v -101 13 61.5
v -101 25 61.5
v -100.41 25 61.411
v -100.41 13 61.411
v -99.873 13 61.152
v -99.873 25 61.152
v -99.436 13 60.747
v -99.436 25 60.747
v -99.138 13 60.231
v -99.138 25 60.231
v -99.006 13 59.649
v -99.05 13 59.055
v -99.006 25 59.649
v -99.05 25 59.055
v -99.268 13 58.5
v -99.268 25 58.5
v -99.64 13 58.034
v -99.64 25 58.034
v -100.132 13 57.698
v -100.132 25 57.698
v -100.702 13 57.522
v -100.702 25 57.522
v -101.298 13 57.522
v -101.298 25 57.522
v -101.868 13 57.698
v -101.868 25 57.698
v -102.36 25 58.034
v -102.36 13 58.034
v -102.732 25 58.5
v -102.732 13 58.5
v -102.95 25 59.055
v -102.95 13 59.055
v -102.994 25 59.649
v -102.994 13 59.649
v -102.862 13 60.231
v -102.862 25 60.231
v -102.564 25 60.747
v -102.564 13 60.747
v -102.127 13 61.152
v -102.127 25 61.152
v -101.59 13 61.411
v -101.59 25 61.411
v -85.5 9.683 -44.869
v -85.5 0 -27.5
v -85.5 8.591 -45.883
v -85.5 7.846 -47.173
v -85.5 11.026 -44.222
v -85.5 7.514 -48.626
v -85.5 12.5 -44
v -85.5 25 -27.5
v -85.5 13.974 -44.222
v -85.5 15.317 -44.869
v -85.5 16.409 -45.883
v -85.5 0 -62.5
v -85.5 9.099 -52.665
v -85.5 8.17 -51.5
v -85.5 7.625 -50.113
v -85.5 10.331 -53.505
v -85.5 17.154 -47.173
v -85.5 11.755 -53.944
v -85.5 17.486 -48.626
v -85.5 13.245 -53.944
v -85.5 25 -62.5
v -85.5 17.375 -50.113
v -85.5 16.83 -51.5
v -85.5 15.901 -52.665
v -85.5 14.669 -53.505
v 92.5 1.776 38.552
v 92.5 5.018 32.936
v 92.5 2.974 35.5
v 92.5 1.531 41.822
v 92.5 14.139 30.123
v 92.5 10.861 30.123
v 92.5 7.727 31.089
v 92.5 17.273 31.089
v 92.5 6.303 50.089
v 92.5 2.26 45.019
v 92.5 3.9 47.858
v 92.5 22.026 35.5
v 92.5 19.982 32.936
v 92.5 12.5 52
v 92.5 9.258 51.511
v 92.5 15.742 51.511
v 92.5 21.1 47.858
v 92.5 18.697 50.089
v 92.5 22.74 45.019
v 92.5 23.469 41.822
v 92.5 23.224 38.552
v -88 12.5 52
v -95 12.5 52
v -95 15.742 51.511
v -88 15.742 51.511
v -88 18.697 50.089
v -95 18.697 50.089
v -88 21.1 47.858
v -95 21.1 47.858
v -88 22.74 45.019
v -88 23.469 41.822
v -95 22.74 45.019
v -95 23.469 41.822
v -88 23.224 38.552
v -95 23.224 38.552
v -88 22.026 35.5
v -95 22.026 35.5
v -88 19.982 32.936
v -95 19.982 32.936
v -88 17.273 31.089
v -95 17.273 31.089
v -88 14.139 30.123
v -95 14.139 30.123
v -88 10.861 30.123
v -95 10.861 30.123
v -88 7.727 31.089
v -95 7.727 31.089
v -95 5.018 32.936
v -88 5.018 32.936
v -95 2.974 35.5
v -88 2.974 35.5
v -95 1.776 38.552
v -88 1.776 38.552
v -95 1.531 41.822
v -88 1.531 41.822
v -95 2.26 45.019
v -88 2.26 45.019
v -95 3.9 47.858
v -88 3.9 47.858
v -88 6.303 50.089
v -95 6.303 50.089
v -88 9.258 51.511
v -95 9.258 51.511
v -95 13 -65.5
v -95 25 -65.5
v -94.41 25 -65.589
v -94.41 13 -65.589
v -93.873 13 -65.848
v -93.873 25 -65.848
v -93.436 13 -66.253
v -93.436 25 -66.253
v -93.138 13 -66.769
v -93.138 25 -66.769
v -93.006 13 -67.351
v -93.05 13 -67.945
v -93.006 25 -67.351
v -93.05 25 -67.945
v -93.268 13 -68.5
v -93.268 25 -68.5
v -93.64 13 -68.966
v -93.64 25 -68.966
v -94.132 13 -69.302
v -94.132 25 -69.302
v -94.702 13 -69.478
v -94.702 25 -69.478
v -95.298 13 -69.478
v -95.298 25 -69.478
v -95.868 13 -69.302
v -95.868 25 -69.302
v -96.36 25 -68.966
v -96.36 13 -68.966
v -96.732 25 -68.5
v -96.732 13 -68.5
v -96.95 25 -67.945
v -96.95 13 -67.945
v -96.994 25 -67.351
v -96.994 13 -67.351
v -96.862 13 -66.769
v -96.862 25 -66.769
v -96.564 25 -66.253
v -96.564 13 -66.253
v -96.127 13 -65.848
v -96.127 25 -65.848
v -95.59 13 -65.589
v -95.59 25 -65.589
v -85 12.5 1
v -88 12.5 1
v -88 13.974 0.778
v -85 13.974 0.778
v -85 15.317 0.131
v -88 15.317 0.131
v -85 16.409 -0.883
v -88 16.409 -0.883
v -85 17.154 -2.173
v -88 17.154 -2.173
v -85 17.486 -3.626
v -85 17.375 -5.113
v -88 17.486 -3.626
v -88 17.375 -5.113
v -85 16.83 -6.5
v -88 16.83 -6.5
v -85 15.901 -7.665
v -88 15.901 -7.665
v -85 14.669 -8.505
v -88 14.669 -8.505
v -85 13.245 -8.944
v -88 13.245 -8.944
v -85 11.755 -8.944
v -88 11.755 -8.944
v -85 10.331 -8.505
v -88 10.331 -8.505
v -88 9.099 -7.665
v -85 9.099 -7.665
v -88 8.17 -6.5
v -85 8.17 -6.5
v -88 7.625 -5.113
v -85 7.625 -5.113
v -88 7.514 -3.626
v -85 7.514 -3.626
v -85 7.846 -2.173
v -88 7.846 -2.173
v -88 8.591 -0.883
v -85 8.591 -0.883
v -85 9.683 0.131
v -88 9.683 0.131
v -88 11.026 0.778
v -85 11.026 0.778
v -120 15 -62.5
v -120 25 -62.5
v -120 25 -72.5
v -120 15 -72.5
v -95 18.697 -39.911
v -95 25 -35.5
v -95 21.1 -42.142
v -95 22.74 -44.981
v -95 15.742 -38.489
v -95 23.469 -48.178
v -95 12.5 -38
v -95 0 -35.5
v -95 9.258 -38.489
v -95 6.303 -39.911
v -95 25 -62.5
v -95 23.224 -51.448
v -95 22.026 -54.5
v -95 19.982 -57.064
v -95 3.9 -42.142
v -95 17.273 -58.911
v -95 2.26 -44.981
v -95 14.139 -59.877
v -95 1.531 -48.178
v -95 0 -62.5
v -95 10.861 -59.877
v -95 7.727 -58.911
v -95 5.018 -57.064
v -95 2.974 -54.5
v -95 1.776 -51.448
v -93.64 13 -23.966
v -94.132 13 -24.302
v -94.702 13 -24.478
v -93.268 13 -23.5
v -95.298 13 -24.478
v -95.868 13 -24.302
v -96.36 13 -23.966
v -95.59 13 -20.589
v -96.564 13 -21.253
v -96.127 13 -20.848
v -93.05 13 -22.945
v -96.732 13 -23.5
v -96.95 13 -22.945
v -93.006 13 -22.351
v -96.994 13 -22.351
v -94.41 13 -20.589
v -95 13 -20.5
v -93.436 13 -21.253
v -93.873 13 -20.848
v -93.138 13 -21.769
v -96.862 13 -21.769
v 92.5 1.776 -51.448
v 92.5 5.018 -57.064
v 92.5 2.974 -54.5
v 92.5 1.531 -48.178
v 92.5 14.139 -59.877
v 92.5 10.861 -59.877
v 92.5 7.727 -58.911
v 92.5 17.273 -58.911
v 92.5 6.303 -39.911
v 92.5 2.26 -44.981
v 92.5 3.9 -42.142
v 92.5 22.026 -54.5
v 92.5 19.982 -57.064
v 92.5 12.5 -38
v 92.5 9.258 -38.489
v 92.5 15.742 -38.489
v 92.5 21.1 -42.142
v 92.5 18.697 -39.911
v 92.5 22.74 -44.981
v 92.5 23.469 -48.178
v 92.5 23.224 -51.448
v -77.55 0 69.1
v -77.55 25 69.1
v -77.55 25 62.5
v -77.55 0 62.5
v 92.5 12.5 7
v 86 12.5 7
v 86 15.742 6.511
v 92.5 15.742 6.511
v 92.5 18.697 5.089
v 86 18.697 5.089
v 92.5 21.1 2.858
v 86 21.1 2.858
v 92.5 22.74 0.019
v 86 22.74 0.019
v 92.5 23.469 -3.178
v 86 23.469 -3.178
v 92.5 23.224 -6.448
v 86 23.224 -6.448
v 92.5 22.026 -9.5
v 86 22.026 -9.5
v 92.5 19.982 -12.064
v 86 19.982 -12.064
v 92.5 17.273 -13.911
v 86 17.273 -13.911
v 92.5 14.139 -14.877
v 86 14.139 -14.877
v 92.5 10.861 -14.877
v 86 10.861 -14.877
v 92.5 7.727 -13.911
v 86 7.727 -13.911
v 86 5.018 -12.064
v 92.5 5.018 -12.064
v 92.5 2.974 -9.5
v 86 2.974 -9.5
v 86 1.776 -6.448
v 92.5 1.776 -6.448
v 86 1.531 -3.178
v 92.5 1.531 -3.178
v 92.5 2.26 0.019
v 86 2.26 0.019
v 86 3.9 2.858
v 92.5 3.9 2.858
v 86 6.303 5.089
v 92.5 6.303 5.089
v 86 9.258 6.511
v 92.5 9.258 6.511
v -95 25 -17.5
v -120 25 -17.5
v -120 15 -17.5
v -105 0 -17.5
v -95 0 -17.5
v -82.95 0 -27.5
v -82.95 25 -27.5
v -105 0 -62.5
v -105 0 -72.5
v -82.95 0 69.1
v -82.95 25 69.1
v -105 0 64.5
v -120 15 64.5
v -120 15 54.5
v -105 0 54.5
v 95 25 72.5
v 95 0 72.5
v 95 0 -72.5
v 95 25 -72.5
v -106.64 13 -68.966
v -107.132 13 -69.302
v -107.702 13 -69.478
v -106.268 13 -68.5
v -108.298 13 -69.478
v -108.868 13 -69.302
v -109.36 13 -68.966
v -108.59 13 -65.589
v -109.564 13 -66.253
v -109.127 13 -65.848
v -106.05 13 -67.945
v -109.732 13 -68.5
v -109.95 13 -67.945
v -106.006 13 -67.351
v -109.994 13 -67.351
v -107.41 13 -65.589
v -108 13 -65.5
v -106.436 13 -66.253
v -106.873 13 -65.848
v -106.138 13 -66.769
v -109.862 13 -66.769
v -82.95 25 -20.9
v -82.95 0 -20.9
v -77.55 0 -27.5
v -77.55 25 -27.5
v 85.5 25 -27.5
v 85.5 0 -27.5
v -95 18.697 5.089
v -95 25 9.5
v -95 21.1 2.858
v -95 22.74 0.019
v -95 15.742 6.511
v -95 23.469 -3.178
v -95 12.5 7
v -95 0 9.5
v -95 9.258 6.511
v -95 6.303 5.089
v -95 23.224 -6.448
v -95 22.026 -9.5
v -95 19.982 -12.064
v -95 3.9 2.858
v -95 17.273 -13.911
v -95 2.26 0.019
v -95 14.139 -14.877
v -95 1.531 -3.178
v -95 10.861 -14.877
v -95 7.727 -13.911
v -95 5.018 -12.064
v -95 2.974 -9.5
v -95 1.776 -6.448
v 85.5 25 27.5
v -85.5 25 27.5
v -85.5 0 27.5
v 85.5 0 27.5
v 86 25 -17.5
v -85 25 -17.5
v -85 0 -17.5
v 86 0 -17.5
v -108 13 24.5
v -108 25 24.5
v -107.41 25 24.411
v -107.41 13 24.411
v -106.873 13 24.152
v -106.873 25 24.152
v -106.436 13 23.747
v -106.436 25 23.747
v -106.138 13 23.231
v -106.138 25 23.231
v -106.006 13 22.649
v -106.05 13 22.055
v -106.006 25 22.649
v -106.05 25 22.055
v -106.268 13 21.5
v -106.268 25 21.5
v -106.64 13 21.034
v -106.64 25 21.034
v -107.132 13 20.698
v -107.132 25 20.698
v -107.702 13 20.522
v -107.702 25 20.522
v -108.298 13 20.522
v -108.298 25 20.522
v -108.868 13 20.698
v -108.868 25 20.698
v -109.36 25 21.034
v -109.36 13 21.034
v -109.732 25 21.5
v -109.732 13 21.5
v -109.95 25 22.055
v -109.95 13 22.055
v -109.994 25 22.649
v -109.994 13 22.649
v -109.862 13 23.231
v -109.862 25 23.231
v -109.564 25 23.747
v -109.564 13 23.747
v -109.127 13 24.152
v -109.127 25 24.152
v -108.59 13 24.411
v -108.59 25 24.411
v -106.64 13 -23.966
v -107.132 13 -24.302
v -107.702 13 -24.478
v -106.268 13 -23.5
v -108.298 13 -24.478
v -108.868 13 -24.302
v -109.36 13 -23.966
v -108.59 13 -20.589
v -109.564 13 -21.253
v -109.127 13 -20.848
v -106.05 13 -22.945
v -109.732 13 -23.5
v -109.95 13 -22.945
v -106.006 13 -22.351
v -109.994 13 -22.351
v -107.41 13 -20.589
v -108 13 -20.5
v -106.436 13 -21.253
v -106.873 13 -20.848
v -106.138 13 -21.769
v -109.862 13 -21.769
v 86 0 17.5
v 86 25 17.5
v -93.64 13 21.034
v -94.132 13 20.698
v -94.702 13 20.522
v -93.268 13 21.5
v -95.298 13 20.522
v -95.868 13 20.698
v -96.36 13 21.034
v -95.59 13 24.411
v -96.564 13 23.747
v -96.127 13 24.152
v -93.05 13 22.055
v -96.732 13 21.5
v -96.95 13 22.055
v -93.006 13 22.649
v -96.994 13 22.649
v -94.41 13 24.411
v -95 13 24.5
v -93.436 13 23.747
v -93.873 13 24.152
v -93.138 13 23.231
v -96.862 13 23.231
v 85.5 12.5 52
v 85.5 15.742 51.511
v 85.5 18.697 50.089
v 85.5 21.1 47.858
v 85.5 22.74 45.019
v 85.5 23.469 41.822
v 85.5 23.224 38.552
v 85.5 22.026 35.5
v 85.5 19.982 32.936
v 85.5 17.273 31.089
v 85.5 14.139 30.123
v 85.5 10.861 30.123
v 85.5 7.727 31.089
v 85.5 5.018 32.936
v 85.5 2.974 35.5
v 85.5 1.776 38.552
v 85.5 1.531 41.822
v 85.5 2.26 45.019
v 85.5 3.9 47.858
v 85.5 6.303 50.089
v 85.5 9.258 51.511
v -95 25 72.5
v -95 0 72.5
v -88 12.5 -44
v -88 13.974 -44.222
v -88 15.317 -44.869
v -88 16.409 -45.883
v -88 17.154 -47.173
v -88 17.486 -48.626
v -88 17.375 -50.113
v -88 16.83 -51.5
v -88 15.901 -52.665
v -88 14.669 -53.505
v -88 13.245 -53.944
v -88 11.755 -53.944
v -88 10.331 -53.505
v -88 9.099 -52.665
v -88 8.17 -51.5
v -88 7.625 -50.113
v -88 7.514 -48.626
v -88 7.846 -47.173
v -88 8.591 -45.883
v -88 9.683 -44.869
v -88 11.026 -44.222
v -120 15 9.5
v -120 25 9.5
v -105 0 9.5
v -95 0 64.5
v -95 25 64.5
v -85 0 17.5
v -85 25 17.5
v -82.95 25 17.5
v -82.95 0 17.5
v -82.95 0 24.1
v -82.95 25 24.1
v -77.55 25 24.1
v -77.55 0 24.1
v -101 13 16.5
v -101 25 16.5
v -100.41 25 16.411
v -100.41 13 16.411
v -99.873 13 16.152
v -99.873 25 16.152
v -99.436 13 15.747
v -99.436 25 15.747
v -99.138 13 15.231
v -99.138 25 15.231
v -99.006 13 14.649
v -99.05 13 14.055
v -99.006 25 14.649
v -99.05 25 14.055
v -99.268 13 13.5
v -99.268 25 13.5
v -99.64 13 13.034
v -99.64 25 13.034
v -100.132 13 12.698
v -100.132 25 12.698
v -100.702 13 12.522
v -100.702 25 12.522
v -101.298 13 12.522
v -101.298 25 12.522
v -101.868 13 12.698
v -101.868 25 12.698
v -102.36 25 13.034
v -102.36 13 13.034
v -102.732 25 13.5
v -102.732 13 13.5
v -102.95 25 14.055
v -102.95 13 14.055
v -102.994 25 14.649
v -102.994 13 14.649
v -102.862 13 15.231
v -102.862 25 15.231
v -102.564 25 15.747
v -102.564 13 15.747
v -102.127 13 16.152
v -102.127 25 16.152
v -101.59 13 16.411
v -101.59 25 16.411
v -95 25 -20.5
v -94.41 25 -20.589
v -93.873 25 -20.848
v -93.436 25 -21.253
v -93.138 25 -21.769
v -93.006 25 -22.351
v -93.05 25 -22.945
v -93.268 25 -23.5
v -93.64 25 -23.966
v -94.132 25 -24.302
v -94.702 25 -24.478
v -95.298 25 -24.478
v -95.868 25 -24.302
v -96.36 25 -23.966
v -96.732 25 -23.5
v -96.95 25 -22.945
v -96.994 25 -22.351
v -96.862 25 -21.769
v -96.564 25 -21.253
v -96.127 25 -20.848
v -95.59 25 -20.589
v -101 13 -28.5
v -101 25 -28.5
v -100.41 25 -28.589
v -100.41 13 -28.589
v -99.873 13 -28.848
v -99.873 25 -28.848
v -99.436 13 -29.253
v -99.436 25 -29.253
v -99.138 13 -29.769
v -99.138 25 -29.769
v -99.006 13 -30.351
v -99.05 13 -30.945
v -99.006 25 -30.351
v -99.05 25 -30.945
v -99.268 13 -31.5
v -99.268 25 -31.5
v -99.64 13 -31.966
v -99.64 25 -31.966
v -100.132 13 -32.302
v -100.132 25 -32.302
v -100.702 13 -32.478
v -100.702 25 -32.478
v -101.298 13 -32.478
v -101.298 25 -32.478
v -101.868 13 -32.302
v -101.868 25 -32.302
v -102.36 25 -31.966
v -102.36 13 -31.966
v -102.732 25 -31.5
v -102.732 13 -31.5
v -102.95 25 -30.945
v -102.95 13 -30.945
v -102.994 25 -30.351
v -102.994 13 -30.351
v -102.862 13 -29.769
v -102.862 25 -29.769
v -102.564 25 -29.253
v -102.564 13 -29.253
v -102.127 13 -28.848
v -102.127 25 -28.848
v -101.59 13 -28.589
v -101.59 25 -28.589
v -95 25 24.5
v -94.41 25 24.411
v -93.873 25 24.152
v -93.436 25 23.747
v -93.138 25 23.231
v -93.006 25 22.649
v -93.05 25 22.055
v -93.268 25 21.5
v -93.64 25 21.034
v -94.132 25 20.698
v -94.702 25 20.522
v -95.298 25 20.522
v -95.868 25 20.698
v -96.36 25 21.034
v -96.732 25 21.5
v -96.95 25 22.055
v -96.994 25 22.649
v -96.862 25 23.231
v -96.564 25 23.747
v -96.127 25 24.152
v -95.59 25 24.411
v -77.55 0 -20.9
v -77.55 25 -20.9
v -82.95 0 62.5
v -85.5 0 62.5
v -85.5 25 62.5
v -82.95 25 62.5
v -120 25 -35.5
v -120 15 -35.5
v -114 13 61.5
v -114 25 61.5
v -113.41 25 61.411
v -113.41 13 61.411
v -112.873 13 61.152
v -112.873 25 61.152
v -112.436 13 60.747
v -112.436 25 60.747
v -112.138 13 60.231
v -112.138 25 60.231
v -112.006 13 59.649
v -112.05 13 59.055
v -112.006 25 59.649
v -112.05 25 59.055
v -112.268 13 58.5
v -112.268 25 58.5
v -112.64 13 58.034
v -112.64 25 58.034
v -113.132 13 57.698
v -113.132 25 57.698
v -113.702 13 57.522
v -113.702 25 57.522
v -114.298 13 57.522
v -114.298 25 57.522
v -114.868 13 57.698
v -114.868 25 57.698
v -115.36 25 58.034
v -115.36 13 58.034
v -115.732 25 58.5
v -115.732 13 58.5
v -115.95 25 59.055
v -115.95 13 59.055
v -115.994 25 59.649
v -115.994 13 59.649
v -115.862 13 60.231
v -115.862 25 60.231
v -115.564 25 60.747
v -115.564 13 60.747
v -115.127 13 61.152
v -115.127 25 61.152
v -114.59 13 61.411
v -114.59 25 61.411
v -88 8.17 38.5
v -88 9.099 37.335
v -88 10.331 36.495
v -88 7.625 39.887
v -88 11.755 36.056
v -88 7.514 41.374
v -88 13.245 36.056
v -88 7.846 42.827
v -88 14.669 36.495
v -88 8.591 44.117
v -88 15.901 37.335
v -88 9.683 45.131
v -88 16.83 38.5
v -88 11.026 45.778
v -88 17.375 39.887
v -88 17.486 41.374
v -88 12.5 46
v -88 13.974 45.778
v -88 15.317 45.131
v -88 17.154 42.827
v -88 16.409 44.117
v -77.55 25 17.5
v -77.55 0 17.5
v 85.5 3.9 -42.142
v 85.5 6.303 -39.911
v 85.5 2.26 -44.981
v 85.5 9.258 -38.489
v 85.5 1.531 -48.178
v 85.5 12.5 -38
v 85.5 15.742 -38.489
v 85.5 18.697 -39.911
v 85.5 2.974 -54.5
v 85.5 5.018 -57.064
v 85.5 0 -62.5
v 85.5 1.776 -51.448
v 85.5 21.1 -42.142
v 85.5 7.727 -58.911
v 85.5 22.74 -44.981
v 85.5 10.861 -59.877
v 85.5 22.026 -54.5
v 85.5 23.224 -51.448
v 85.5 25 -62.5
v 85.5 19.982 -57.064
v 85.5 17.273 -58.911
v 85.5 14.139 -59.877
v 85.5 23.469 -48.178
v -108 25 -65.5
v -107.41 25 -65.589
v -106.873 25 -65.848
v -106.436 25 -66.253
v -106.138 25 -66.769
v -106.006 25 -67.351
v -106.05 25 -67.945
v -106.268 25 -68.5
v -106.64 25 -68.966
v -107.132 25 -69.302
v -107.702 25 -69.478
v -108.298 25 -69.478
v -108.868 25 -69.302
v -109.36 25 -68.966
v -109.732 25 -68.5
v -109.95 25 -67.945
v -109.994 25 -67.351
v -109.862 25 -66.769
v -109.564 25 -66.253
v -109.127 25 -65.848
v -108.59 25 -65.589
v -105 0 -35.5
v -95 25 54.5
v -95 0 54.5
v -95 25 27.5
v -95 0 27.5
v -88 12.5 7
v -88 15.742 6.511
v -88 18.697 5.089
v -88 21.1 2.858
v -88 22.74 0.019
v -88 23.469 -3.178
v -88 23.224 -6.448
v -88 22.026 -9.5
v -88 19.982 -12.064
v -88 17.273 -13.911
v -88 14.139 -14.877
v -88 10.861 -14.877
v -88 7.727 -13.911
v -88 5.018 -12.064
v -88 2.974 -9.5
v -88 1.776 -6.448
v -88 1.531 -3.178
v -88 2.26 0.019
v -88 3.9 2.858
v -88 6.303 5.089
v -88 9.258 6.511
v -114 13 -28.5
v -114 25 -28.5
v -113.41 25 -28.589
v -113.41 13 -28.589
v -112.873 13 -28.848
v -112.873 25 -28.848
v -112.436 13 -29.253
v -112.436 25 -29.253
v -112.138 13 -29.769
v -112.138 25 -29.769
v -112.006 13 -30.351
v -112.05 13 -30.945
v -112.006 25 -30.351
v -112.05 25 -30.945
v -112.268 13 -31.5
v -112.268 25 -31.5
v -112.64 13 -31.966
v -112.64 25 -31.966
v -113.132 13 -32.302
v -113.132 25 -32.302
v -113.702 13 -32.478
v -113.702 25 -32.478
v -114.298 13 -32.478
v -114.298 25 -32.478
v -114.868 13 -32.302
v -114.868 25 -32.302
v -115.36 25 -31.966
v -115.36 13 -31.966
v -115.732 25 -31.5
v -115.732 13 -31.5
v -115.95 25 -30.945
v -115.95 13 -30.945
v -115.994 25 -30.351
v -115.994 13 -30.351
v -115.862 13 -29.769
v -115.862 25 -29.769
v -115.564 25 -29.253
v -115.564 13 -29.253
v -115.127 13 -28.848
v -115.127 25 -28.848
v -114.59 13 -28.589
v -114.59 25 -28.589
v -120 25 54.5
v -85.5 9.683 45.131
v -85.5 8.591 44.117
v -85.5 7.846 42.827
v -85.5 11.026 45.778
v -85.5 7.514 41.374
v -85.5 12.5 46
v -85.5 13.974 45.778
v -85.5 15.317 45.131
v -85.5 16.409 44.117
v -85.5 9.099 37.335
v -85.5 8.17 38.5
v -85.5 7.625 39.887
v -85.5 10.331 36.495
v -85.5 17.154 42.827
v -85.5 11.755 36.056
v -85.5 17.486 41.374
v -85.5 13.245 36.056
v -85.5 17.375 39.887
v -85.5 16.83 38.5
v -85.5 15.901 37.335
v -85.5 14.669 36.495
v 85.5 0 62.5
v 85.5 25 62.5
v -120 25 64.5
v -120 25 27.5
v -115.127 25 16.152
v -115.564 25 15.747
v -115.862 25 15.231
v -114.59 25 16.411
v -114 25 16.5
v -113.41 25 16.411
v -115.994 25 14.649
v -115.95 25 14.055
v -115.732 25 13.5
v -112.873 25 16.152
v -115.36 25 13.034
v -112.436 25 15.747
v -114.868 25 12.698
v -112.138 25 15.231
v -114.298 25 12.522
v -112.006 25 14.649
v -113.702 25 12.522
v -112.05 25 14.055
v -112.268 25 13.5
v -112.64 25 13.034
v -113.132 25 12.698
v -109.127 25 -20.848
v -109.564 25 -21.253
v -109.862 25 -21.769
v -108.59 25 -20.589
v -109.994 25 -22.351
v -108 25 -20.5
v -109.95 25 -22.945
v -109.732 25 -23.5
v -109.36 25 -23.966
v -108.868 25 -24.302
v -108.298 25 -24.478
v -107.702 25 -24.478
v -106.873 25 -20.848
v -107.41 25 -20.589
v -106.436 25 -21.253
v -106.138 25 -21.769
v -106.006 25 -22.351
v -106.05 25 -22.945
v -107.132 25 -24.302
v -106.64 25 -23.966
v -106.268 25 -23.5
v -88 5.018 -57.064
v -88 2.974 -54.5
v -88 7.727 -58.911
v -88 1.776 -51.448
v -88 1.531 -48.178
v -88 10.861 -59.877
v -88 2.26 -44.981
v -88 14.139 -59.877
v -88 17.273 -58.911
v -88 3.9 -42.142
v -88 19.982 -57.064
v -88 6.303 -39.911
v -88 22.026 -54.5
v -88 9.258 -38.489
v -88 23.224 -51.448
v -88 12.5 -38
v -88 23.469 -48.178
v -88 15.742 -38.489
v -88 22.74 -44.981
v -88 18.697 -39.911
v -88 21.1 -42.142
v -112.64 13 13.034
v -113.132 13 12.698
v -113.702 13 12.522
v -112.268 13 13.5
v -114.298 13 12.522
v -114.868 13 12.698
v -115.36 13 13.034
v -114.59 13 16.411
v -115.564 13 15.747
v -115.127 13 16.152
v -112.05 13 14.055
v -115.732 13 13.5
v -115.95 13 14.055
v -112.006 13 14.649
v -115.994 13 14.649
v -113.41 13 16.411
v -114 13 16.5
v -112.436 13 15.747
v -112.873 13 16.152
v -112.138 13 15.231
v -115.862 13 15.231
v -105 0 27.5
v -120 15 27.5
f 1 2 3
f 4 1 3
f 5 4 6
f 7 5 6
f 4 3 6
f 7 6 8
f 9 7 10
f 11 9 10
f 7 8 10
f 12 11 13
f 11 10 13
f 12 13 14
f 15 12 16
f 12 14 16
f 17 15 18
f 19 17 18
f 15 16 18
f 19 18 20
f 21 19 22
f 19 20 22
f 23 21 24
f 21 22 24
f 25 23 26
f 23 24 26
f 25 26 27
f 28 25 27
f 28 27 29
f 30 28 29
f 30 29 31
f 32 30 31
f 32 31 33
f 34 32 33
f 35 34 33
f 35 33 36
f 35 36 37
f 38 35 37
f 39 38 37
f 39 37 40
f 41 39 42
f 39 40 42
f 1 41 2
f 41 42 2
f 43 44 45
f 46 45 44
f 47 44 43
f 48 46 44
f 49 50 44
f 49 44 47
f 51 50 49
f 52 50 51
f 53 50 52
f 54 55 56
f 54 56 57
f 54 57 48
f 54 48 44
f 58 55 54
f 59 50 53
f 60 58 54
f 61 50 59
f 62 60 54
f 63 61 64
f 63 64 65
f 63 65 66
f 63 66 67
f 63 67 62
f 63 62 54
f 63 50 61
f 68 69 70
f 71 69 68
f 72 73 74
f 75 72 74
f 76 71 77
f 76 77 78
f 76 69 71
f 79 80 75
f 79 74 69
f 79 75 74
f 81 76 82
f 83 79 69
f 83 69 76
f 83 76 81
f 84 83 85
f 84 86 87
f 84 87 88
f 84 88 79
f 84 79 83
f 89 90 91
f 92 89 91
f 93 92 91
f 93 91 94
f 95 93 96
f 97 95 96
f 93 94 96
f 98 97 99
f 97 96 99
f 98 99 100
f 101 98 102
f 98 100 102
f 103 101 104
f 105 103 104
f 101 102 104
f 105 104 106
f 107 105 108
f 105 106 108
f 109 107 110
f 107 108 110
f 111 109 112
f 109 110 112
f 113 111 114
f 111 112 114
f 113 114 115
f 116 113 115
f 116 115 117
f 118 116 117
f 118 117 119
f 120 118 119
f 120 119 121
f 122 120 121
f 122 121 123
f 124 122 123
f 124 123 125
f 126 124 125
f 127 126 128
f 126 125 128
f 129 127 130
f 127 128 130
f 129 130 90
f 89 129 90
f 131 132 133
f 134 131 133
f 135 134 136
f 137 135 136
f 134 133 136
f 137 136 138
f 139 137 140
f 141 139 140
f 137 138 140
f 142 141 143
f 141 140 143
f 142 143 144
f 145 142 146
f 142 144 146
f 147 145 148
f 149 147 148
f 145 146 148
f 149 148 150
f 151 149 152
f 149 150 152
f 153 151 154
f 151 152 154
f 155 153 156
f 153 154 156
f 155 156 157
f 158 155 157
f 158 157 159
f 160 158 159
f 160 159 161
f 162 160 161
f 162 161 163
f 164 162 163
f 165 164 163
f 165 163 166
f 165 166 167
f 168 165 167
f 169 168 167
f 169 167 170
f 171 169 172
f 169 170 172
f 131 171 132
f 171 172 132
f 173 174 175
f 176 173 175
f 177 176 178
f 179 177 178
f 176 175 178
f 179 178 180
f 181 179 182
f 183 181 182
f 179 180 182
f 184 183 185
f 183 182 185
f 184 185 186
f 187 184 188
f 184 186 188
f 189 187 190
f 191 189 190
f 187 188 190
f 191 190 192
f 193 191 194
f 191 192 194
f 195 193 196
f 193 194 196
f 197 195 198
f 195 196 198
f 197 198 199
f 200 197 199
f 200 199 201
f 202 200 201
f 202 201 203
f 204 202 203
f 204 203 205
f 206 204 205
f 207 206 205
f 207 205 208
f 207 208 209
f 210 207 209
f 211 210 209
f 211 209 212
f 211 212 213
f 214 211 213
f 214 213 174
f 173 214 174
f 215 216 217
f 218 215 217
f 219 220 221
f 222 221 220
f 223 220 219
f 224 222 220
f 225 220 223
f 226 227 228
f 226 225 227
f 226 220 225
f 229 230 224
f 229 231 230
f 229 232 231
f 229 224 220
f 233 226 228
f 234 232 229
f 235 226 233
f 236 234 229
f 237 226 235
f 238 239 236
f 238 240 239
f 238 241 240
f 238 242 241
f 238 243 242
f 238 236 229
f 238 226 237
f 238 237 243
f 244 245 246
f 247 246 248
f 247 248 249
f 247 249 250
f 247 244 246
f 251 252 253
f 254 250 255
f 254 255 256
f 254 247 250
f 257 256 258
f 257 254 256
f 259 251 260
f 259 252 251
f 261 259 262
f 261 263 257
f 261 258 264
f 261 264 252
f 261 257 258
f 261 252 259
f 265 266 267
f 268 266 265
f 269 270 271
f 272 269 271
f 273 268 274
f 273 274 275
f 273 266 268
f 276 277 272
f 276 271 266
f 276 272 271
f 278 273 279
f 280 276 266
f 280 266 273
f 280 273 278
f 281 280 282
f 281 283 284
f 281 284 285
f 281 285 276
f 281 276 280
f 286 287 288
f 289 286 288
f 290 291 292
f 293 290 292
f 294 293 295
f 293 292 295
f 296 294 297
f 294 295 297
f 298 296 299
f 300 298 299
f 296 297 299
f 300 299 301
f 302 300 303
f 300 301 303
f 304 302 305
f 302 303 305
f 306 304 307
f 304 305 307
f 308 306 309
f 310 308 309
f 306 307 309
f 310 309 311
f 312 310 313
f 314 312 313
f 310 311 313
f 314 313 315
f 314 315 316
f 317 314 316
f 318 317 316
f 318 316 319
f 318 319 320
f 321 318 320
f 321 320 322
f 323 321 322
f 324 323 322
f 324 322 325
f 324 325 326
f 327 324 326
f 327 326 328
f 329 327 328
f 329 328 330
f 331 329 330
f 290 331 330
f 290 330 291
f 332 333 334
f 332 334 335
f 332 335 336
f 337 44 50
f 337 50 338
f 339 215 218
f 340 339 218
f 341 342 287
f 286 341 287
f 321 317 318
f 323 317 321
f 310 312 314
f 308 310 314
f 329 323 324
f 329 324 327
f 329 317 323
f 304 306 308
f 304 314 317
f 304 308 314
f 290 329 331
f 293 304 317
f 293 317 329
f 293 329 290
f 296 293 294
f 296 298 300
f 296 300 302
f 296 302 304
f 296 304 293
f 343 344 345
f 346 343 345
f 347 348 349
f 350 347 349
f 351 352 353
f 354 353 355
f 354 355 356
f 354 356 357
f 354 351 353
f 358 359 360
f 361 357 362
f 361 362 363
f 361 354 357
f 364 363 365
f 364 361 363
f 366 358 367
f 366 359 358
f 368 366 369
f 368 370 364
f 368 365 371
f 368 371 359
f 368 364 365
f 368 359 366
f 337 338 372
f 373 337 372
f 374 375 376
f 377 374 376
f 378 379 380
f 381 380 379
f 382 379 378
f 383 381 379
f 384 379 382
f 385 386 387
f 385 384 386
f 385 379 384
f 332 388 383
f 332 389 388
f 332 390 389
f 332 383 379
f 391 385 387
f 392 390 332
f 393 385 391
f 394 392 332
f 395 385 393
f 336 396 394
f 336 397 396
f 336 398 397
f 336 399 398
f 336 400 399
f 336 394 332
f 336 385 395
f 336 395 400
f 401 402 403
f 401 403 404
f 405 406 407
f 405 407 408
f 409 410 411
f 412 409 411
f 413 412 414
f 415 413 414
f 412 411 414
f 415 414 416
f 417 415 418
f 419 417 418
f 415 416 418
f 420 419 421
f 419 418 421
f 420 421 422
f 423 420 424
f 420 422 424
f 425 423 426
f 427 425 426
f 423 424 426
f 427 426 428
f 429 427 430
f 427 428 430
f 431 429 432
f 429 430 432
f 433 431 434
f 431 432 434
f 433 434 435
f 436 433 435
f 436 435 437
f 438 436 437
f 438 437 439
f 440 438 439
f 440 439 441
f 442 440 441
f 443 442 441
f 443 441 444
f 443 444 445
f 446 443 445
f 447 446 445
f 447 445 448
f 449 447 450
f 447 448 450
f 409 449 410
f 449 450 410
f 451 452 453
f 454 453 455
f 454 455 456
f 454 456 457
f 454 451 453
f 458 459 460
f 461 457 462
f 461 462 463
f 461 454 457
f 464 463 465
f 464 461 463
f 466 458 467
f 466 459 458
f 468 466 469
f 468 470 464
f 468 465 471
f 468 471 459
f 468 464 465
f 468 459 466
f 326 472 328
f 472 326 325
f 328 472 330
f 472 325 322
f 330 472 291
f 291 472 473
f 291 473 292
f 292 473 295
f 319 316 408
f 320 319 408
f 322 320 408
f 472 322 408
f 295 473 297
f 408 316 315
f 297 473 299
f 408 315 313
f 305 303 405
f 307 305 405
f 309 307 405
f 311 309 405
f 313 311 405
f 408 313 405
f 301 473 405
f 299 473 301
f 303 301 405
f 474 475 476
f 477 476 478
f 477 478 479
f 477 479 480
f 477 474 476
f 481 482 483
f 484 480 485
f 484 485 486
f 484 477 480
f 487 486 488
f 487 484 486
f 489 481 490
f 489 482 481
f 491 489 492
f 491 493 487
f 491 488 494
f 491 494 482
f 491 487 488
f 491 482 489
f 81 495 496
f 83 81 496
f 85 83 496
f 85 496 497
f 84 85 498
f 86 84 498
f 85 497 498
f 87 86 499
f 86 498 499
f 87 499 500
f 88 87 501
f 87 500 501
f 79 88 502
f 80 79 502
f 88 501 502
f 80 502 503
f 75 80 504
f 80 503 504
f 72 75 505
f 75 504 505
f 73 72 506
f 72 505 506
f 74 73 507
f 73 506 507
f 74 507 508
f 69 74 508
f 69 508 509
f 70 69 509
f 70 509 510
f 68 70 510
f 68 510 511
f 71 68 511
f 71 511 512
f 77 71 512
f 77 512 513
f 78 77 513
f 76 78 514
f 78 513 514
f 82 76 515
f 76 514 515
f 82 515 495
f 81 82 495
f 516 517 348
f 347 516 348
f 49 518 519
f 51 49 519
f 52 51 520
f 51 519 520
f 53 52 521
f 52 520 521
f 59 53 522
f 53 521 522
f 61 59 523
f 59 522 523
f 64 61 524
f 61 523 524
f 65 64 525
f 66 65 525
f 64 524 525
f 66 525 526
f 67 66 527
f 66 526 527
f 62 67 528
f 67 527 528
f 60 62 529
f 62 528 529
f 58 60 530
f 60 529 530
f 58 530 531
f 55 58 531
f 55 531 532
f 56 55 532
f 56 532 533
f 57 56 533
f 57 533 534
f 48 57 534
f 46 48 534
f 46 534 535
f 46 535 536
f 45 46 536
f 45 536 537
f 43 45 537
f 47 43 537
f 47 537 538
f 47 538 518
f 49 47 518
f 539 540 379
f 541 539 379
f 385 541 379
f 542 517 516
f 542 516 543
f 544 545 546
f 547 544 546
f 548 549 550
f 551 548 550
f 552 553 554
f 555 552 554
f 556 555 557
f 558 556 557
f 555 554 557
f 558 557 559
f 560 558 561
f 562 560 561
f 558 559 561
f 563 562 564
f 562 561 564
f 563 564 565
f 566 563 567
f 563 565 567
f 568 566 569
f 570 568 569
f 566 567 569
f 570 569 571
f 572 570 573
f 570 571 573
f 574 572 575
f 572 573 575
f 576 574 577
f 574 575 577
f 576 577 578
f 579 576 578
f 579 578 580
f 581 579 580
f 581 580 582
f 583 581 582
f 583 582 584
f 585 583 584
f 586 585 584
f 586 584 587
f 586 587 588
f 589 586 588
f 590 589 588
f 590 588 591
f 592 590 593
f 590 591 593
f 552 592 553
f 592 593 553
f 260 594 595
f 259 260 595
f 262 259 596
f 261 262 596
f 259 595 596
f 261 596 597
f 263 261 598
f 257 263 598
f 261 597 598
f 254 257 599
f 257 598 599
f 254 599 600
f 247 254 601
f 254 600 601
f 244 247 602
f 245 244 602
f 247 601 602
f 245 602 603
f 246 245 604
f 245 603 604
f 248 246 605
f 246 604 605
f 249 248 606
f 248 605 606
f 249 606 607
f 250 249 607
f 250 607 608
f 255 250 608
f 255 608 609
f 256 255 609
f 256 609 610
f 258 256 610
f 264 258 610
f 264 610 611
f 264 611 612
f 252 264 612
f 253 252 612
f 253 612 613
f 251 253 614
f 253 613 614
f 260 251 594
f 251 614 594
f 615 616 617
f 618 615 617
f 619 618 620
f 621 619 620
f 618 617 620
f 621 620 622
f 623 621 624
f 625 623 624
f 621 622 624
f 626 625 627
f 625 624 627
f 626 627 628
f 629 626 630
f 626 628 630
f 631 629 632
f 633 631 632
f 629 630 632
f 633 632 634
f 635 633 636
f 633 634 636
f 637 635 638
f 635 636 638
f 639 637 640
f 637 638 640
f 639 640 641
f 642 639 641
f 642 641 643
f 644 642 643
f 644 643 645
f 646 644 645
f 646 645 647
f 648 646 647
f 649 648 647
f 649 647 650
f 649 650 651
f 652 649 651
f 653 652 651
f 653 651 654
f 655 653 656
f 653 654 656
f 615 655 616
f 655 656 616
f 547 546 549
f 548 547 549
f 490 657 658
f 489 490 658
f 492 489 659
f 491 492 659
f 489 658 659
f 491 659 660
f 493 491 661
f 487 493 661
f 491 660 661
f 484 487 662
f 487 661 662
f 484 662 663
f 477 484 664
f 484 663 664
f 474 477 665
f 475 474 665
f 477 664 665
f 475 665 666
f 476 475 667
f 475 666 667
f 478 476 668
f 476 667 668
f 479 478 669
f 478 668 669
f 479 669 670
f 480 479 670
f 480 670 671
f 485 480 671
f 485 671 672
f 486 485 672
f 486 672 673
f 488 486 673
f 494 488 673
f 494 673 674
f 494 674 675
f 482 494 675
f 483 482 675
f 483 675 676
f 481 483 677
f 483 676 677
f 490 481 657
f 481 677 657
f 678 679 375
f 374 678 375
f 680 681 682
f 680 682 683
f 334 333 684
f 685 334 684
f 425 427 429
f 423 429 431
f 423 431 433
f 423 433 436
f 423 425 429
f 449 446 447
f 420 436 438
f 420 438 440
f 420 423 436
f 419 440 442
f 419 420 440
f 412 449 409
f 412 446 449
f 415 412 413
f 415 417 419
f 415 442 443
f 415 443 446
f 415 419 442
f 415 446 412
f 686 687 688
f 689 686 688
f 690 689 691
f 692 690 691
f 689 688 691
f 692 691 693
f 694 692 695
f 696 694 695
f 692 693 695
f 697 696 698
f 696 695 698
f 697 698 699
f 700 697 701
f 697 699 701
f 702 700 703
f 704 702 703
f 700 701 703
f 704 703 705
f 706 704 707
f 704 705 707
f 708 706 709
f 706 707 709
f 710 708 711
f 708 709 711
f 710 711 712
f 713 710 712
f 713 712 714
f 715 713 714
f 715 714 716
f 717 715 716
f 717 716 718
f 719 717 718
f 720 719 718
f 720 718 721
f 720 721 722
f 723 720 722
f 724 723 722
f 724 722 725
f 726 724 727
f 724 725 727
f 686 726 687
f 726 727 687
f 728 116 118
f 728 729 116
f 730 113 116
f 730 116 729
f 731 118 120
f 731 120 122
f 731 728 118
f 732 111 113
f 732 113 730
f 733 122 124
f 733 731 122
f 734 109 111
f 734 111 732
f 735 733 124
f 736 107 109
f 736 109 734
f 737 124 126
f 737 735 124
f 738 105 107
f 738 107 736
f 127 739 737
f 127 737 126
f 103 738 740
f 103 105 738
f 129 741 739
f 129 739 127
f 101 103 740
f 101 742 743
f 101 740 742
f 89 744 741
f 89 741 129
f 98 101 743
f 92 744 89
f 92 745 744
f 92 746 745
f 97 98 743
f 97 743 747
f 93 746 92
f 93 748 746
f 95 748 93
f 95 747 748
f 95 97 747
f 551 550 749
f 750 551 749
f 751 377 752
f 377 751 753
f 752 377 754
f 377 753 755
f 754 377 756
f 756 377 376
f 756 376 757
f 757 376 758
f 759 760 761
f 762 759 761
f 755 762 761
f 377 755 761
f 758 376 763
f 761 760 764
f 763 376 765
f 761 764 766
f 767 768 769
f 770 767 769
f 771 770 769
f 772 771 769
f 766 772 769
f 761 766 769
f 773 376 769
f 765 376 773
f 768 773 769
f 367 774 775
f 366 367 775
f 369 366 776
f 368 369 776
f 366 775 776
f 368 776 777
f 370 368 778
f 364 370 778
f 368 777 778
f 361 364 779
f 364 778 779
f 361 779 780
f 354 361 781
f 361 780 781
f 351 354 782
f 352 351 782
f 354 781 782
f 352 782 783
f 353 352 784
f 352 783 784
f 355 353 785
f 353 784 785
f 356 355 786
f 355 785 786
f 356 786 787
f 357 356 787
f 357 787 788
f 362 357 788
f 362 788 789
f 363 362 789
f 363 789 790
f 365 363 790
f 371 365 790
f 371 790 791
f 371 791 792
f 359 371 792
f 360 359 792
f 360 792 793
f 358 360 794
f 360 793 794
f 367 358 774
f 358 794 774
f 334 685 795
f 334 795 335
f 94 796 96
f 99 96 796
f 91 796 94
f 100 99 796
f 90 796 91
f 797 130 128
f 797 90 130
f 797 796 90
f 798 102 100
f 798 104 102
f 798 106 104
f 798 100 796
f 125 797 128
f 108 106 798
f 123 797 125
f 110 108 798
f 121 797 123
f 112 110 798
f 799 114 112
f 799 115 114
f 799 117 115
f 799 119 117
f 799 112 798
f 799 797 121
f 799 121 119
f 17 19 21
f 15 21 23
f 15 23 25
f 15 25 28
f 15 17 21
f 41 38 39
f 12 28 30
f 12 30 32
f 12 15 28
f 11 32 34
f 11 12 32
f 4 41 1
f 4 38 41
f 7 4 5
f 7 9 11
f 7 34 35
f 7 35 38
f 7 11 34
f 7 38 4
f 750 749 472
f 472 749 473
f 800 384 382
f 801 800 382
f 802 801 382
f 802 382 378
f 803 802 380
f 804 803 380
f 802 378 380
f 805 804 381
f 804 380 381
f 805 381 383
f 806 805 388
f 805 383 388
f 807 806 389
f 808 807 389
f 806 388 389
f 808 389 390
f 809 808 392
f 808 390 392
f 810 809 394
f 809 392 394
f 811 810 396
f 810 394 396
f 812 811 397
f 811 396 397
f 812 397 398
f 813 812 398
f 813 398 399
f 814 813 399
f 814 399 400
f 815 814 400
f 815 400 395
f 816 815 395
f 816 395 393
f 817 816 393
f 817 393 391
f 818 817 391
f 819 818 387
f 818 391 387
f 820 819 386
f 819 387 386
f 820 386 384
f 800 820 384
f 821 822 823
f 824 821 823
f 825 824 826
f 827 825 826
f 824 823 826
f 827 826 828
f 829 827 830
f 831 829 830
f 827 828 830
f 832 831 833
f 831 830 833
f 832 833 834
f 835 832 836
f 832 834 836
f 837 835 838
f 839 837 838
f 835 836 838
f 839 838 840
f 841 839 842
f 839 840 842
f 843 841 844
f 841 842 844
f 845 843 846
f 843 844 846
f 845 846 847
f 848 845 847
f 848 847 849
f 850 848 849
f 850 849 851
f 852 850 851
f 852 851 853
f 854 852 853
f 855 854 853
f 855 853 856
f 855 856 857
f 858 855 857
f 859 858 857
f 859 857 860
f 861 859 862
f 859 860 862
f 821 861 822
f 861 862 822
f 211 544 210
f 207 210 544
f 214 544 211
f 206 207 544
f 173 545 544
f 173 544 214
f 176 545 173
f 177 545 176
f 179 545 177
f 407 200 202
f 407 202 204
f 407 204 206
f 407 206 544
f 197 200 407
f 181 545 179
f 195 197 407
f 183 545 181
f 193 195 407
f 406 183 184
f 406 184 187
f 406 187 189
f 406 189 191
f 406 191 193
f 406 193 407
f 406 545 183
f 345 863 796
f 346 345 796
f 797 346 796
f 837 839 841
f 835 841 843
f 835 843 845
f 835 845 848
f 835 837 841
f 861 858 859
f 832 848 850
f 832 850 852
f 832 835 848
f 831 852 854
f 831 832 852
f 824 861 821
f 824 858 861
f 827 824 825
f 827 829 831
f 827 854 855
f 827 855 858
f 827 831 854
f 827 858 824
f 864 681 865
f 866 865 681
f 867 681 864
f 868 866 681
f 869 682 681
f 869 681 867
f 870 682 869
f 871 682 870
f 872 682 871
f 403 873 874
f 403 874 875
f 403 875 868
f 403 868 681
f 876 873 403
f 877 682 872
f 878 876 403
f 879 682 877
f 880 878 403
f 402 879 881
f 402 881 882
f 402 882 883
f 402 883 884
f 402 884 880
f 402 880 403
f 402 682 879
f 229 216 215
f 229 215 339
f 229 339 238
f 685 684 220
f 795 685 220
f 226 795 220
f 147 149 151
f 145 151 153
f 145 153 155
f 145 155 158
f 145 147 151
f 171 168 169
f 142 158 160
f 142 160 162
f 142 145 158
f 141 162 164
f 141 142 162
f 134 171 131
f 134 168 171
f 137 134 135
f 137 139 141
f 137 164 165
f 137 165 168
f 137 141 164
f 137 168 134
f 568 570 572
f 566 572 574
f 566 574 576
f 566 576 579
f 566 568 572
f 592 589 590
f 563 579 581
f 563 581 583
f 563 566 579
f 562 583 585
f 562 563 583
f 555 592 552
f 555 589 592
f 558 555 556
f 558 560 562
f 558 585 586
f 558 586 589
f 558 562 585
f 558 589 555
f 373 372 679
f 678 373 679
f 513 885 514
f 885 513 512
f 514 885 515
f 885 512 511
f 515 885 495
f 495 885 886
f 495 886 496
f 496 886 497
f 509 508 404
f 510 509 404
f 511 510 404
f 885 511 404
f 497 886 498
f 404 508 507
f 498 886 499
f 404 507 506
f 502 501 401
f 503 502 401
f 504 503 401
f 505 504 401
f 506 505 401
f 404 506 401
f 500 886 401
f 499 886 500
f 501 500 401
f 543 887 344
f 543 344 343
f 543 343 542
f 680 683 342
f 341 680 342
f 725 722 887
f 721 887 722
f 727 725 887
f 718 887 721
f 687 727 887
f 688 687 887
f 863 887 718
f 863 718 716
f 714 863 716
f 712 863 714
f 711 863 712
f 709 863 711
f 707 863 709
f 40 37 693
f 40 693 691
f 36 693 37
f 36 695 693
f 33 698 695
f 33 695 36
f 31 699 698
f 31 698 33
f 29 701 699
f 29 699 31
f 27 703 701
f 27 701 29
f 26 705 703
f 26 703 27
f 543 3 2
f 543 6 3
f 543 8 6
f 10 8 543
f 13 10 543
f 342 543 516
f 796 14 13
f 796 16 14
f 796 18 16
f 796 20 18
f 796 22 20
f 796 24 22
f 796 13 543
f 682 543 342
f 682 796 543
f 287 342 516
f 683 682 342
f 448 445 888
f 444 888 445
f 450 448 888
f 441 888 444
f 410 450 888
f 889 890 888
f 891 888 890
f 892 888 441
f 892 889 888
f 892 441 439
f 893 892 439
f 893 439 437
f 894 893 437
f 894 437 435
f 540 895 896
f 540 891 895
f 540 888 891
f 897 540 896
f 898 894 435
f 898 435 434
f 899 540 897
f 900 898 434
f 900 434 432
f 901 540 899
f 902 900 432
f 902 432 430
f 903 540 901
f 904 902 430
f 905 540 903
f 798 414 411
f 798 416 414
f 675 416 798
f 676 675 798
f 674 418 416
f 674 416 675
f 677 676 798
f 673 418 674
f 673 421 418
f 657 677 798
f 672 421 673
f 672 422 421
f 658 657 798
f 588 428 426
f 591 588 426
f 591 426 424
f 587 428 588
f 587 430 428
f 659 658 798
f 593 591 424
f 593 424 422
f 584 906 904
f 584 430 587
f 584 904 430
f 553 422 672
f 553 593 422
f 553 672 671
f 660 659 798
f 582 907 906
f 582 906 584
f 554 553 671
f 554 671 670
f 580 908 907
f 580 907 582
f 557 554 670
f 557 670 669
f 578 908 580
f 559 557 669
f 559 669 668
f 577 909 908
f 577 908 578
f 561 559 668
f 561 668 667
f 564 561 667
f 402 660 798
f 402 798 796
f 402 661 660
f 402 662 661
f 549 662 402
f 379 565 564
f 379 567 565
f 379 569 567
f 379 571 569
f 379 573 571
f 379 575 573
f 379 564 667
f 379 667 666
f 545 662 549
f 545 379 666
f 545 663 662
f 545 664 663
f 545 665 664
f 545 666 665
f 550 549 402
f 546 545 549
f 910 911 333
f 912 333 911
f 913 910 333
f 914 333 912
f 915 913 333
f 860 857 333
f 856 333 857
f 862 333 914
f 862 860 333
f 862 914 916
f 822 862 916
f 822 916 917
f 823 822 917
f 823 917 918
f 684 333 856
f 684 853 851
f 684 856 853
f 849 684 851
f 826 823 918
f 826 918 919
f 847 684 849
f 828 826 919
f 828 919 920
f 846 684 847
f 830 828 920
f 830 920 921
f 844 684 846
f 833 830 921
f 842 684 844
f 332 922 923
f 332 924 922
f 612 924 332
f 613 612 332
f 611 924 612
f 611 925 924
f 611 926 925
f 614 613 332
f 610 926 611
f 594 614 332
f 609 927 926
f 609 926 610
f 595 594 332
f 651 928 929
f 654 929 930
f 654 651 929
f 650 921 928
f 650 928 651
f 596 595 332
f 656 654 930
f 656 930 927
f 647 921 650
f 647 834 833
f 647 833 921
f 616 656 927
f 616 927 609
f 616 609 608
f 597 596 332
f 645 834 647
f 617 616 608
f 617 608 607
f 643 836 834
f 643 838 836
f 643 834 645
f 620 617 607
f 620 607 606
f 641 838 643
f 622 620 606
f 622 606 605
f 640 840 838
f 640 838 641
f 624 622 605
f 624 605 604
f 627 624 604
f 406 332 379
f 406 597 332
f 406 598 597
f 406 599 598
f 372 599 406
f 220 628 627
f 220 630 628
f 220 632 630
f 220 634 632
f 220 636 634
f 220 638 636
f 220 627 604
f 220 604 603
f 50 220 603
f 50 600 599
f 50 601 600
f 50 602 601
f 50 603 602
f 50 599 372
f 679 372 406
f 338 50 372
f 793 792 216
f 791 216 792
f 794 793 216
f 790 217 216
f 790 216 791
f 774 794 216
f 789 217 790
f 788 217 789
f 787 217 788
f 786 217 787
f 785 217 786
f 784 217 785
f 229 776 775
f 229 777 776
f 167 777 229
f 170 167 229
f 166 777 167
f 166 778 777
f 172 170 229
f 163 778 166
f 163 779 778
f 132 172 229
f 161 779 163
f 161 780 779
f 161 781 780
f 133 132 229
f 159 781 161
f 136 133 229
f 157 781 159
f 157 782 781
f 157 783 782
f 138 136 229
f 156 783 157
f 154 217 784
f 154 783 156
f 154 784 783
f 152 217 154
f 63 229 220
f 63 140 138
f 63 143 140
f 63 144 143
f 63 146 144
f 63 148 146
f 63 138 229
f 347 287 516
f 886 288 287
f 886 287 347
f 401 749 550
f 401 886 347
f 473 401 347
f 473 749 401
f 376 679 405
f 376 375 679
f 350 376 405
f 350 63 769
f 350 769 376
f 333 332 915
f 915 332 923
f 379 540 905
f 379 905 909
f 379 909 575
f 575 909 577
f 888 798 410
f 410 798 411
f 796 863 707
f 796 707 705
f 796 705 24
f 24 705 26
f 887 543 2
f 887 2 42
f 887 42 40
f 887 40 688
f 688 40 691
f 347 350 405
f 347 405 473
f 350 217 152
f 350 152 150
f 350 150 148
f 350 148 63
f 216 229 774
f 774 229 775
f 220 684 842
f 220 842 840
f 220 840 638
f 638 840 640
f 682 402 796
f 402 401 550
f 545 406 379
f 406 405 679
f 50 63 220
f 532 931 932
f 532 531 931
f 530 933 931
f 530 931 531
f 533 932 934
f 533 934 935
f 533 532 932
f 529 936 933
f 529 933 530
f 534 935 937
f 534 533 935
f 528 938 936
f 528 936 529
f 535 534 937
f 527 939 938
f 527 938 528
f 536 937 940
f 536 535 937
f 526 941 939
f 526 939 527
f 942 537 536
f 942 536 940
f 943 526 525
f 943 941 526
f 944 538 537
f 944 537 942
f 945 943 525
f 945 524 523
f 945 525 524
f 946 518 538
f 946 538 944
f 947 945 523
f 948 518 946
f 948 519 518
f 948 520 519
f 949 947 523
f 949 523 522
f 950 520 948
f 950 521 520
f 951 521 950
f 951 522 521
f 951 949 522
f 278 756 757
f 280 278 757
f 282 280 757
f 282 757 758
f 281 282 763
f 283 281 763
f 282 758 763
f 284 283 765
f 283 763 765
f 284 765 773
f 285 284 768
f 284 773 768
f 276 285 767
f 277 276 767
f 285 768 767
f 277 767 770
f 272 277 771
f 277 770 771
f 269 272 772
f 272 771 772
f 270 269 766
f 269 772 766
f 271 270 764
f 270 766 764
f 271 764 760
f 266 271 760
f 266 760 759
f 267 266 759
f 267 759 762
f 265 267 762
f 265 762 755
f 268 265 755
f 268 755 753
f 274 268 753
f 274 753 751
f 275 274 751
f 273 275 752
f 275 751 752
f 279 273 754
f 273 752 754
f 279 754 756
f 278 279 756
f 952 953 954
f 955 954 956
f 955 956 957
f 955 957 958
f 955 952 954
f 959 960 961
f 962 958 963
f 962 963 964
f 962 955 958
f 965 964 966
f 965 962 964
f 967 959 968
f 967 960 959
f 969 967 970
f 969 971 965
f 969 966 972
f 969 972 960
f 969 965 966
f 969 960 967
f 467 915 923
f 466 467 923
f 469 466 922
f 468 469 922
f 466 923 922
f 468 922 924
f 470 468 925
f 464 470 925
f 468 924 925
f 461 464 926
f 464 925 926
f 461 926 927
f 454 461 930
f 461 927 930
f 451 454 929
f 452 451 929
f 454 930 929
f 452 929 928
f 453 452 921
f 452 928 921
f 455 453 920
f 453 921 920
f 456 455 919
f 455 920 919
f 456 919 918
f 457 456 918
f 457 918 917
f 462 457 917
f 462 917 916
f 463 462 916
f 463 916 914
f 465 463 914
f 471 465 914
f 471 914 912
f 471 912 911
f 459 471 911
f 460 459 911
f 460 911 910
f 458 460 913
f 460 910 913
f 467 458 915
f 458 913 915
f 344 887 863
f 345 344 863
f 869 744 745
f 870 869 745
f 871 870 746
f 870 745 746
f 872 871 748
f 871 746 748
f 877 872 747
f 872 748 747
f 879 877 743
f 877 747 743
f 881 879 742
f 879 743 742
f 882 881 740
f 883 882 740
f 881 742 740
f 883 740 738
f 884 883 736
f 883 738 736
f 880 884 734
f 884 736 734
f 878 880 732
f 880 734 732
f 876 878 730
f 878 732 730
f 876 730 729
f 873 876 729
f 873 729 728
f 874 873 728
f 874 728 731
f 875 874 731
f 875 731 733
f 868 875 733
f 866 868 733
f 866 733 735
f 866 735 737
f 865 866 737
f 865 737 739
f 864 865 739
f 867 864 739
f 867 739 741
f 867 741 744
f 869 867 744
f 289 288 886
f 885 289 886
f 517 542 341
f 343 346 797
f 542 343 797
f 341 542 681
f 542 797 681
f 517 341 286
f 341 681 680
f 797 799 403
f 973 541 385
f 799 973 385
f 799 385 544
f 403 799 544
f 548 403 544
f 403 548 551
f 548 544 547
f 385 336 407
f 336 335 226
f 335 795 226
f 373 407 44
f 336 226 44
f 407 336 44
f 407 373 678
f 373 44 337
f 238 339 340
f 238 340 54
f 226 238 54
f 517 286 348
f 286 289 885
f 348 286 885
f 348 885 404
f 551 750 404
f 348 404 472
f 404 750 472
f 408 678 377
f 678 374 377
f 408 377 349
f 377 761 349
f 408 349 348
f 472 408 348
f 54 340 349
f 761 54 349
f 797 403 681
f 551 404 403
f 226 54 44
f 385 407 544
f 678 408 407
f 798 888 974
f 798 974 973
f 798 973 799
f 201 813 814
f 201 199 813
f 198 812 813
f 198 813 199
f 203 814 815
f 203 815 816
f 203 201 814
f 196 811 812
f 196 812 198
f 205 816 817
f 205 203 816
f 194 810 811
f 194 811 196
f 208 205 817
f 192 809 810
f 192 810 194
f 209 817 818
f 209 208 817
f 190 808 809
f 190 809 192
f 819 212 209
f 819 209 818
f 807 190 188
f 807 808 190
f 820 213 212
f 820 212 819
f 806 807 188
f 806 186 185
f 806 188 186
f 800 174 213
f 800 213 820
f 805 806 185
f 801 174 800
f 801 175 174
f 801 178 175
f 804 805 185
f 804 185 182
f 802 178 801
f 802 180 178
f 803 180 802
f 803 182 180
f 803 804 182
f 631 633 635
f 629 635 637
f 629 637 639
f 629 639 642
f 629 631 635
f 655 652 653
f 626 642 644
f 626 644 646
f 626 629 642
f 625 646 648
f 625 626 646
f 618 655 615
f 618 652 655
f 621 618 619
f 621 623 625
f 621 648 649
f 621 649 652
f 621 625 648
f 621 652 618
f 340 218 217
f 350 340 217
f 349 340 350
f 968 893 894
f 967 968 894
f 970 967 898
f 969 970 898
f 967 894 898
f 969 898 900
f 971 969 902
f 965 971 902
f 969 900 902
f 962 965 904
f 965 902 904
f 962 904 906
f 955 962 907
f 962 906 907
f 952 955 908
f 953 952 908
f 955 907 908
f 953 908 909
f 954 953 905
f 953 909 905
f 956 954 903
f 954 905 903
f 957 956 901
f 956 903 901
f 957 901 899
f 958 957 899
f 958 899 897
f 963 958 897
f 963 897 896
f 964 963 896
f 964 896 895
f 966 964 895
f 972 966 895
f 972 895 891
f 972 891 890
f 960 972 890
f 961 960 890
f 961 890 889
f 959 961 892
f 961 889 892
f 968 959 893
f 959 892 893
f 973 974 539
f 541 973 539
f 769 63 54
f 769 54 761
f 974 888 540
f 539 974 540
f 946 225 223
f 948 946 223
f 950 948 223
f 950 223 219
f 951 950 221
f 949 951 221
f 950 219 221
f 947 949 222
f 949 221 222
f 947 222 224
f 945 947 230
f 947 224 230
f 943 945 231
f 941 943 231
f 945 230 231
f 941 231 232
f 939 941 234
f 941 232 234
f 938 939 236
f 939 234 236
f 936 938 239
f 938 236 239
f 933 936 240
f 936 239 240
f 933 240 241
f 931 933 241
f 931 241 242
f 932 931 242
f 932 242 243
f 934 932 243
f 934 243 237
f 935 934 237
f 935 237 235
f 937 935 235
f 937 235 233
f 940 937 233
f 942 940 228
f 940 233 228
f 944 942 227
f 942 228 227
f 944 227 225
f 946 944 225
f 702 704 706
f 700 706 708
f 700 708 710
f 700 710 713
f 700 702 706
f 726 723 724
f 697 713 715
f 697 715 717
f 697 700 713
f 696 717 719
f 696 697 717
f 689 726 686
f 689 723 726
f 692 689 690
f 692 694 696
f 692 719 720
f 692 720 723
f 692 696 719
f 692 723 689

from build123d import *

# Parameters (mm, degrees)
SZKIC1_W                    = 190
SZKIC1_H                    = 145
DODANIE_WYCI_GNI_CIE1_DEPTH = 25
SZKIC2_W                    = 171
SZKIC2_H                    = 35
WYTNIJ_WYCI_GNI_CIE1_DEPTH  = 50
SZKIC3_R                    = 11
WYTNIJ_WYCI_GNI_CIE2_DEPTH  = 7
SZKIC4_R                    = 11
WYTNIJ_WYCI_GNI_CIE3_DEPTH  = 7
SZKIC5_R                    = 5
WYTNIJ_WYCI_GNI_CIE4_DEPTH  = 7
SZKIC7_W                    = 25
SZKIC7_H                    = 10
DODANIE_WYCI_GNI_CIE2_DEPTH = 25
SZKIC8_R                    = 2
WYTNIJ_WYCI_GNI_CIE5_DEPTH  = 12
WYTNIJ_WYCI_GNI_CIE6_DEPTH  = 40
SZYK_LINIOWY1_COUNT         = 3
SZYK_LINIOWY1_PITCH         = 45
SFAZOWANIE1_SIZE            = 15


with BuildPart() as part:
    # Szkic1 → Dodanie-wyciągnięcie1 (new body)
    with BuildSketch(Plane(origin=(0, 0, 0), x_dir=(1, 0, 0), z_dir=(0, 1, 0))):
        Rectangle(SZKIC1_W, SZKIC1_H)
    extrude(amount=DODANIE_WYCI_GNI_CIE1_DEPTH)

    # Szkic2 → Wytnij-wyciągnięcie1 (cut)
    with BuildSketch(Plane(origin=(0, 25, 0), x_dir=(1, 0, 0), z_dir=(0, 1, 0))):
        with Locations((0.5, 0)):
            Rectangle(SZKIC2_W, SZKIC2_H)
        with Locations((0, -45)):
            Rectangle(SZKIC2_W, SZKIC2_H)
        with Locations((0, 45)):
            Rectangle(SZKIC2_W, SZKIC2_H)
    extrude(amount=-WYTNIJ_WYCI_GNI_CIE1_DEPTH, mode=Mode.SUBTRACT)

    # Szkic3 → Wytnij-wyciągnięcie2 (cut)
    with BuildSketch(Plane.ZY.offset(-85.5)):
        with Locations((41, 12.5)):
            Circle(SZKIC3_R)
    wytnij_wyci_gni_cie2 = extrude(amount=-WYTNIJ_WYCI_GNI_CIE2_DEPTH, mode=Mode.SUBTRACT)

    # Szkic4 → Wytnij-wyciągnięcie3 (cut)
    with BuildSketch(Plane.ZY.offset(95)):
        with Locations((41, 12.5)):
            Circle(SZKIC4_R)
    wytnij_wyci_gni_cie3 = extrude(amount=-WYTNIJ_WYCI_GNI_CIE3_DEPTH, mode=Mode.SUBTRACT)

    # Szkic5 → Wytnij-wyciągnięcie4 (cut)
    with BuildSketch(Plane.ZY.offset(88)):
        with Locations((41, 12.5)):
            Circle(SZKIC5_R)
    wytnij_wyci_gni_cie4 = extrude(amount=-WYTNIJ_WYCI_GNI_CIE4_DEPTH, mode=Mode.SUBTRACT)

    # Szkic7 → Dodanie-wyciągnięcie2 (add)
    with BuildSketch(Plane(origin=(0, 25, 0), x_dir=(1, 0, 0), z_dir=(0, 1, 0))):
        with Locations((-107.5, -22.5)):
            Rectangle(SZKIC7_W, SZKIC7_H)
        with Locations((-107.5, -59.5)):
            Rectangle(SZKIC7_W, SZKIC7_H)
    dodanie_wyci_gni_cie2 = extrude(amount=-DODANIE_WYCI_GNI_CIE2_DEPTH)

    # Szkic8 → Wytnij-wyciągnięcie5 (cut)
    with BuildSketch(Plane(origin=(0, 25, 0), x_dir=(1, 0, 0), z_dir=(0, 1, 0))):
        with Locations(Location((-114, -59.5, 0), (0, 0, 270))):
            Circle(SZKIC8_R)
        with Locations(Location((-101, -59.5, 0), (0, 0, 270))):
            Circle(SZKIC8_R)
        with Locations(Location((-108, -22.5, 0), (0, 0, 270))):
            Circle(SZKIC8_R)
        with Locations(Location((-95, -22.5, 0), (0, 0, 270))):
            Circle(SZKIC8_R)
    wytnij_wyci_gni_cie5 = extrude(amount=-WYTNIJ_WYCI_GNI_CIE5_DEPTH, mode=Mode.SUBTRACT)

    # Szkic10 → Wytnij-wyciągnięcie6 (cut)
    with BuildSketch(Plane(origin=(0, 25, 0), x_dir=(1, 0, 0), z_dir=(0, 1, 0))):
        with BuildLine():
            Line((-77.55, -69.1), (-77.55, -62.5))
            Line((-77.55, -62.5), (-79.425, -62.5))
            Line((-79.425, -62.5), (-79.425, -64.360545416))
            ThreePointArc((-79.425, -64.360545416), (-80.25, -68.6), (-81.075, -64.360545416))
            Line((-81.075, -64.360545416), (-81.075, -62.5))
            Line((-81.075, -62.5), (-82.95, -62.5))
            Line((-82.95, -62.5), (-82.95, -69.1))
            Line((-82.95, -69.1), (-77.55, -69.1))
        make_face()
        with BuildLine():
            Line((-79.425, -64.360545416), (-79.425, -62.5))
            Line((-79.425, -62.5), (-81.075, -62.5))
            Line((-81.075, -62.5), (-81.075, -64.360545416))
            ThreePointArc((-81.075, -64.360545416), (-80.25, -68.6), (-79.425, -64.360545416))
        make_face()
    wytnij_wyci_gni_cie6 = extrude(amount=-WYTNIJ_WYCI_GNI_CIE6_DEPTH, mode=Mode.SUBTRACT)

    # Szyk liniowy1: Wytnij-wyciągnięcie2, Wytnij-wyciągnięcie3, Wytnij-wyciągnięcie4, Dodanie-wyciągnięcie2, Wytnij-wyciągnięcie5, Wytnij-wyciągnięcie6 ×3
    with Locations(*[(0, 0, -i * SZYK_LINIOWY1_PITCH) for i in range(1, SZYK_LINIOWY1_COUNT)]):
        add(wytnij_wyci_gni_cie2, mode=Mode.SUBTRACT)
        add(wytnij_wyci_gni_cie3, mode=Mode.SUBTRACT)
        add(wytnij_wyci_gni_cie4, mode=Mode.SUBTRACT)
        add(dodanie_wyci_gni_cie2)
        add(wytnij_wyci_gni_cie5, mode=Mode.SUBTRACT)
        add(wytnij_wyci_gni_cie6, mode=Mode.SUBTRACT)

    # Sfazowanie1
    sfazowanie1_edges = [part.edges().sort_by_distance(p)[0] for p in [
        (-120, 0, 59.5),
        (-120, 0, -26.5),
        (-120, 0, -67.5),
        (-120, 0, 18.5),
    ]]
    chamfer(sfazowanie1_edges, length=SFAZOWANIE1_SIZE)


solid = part.part
